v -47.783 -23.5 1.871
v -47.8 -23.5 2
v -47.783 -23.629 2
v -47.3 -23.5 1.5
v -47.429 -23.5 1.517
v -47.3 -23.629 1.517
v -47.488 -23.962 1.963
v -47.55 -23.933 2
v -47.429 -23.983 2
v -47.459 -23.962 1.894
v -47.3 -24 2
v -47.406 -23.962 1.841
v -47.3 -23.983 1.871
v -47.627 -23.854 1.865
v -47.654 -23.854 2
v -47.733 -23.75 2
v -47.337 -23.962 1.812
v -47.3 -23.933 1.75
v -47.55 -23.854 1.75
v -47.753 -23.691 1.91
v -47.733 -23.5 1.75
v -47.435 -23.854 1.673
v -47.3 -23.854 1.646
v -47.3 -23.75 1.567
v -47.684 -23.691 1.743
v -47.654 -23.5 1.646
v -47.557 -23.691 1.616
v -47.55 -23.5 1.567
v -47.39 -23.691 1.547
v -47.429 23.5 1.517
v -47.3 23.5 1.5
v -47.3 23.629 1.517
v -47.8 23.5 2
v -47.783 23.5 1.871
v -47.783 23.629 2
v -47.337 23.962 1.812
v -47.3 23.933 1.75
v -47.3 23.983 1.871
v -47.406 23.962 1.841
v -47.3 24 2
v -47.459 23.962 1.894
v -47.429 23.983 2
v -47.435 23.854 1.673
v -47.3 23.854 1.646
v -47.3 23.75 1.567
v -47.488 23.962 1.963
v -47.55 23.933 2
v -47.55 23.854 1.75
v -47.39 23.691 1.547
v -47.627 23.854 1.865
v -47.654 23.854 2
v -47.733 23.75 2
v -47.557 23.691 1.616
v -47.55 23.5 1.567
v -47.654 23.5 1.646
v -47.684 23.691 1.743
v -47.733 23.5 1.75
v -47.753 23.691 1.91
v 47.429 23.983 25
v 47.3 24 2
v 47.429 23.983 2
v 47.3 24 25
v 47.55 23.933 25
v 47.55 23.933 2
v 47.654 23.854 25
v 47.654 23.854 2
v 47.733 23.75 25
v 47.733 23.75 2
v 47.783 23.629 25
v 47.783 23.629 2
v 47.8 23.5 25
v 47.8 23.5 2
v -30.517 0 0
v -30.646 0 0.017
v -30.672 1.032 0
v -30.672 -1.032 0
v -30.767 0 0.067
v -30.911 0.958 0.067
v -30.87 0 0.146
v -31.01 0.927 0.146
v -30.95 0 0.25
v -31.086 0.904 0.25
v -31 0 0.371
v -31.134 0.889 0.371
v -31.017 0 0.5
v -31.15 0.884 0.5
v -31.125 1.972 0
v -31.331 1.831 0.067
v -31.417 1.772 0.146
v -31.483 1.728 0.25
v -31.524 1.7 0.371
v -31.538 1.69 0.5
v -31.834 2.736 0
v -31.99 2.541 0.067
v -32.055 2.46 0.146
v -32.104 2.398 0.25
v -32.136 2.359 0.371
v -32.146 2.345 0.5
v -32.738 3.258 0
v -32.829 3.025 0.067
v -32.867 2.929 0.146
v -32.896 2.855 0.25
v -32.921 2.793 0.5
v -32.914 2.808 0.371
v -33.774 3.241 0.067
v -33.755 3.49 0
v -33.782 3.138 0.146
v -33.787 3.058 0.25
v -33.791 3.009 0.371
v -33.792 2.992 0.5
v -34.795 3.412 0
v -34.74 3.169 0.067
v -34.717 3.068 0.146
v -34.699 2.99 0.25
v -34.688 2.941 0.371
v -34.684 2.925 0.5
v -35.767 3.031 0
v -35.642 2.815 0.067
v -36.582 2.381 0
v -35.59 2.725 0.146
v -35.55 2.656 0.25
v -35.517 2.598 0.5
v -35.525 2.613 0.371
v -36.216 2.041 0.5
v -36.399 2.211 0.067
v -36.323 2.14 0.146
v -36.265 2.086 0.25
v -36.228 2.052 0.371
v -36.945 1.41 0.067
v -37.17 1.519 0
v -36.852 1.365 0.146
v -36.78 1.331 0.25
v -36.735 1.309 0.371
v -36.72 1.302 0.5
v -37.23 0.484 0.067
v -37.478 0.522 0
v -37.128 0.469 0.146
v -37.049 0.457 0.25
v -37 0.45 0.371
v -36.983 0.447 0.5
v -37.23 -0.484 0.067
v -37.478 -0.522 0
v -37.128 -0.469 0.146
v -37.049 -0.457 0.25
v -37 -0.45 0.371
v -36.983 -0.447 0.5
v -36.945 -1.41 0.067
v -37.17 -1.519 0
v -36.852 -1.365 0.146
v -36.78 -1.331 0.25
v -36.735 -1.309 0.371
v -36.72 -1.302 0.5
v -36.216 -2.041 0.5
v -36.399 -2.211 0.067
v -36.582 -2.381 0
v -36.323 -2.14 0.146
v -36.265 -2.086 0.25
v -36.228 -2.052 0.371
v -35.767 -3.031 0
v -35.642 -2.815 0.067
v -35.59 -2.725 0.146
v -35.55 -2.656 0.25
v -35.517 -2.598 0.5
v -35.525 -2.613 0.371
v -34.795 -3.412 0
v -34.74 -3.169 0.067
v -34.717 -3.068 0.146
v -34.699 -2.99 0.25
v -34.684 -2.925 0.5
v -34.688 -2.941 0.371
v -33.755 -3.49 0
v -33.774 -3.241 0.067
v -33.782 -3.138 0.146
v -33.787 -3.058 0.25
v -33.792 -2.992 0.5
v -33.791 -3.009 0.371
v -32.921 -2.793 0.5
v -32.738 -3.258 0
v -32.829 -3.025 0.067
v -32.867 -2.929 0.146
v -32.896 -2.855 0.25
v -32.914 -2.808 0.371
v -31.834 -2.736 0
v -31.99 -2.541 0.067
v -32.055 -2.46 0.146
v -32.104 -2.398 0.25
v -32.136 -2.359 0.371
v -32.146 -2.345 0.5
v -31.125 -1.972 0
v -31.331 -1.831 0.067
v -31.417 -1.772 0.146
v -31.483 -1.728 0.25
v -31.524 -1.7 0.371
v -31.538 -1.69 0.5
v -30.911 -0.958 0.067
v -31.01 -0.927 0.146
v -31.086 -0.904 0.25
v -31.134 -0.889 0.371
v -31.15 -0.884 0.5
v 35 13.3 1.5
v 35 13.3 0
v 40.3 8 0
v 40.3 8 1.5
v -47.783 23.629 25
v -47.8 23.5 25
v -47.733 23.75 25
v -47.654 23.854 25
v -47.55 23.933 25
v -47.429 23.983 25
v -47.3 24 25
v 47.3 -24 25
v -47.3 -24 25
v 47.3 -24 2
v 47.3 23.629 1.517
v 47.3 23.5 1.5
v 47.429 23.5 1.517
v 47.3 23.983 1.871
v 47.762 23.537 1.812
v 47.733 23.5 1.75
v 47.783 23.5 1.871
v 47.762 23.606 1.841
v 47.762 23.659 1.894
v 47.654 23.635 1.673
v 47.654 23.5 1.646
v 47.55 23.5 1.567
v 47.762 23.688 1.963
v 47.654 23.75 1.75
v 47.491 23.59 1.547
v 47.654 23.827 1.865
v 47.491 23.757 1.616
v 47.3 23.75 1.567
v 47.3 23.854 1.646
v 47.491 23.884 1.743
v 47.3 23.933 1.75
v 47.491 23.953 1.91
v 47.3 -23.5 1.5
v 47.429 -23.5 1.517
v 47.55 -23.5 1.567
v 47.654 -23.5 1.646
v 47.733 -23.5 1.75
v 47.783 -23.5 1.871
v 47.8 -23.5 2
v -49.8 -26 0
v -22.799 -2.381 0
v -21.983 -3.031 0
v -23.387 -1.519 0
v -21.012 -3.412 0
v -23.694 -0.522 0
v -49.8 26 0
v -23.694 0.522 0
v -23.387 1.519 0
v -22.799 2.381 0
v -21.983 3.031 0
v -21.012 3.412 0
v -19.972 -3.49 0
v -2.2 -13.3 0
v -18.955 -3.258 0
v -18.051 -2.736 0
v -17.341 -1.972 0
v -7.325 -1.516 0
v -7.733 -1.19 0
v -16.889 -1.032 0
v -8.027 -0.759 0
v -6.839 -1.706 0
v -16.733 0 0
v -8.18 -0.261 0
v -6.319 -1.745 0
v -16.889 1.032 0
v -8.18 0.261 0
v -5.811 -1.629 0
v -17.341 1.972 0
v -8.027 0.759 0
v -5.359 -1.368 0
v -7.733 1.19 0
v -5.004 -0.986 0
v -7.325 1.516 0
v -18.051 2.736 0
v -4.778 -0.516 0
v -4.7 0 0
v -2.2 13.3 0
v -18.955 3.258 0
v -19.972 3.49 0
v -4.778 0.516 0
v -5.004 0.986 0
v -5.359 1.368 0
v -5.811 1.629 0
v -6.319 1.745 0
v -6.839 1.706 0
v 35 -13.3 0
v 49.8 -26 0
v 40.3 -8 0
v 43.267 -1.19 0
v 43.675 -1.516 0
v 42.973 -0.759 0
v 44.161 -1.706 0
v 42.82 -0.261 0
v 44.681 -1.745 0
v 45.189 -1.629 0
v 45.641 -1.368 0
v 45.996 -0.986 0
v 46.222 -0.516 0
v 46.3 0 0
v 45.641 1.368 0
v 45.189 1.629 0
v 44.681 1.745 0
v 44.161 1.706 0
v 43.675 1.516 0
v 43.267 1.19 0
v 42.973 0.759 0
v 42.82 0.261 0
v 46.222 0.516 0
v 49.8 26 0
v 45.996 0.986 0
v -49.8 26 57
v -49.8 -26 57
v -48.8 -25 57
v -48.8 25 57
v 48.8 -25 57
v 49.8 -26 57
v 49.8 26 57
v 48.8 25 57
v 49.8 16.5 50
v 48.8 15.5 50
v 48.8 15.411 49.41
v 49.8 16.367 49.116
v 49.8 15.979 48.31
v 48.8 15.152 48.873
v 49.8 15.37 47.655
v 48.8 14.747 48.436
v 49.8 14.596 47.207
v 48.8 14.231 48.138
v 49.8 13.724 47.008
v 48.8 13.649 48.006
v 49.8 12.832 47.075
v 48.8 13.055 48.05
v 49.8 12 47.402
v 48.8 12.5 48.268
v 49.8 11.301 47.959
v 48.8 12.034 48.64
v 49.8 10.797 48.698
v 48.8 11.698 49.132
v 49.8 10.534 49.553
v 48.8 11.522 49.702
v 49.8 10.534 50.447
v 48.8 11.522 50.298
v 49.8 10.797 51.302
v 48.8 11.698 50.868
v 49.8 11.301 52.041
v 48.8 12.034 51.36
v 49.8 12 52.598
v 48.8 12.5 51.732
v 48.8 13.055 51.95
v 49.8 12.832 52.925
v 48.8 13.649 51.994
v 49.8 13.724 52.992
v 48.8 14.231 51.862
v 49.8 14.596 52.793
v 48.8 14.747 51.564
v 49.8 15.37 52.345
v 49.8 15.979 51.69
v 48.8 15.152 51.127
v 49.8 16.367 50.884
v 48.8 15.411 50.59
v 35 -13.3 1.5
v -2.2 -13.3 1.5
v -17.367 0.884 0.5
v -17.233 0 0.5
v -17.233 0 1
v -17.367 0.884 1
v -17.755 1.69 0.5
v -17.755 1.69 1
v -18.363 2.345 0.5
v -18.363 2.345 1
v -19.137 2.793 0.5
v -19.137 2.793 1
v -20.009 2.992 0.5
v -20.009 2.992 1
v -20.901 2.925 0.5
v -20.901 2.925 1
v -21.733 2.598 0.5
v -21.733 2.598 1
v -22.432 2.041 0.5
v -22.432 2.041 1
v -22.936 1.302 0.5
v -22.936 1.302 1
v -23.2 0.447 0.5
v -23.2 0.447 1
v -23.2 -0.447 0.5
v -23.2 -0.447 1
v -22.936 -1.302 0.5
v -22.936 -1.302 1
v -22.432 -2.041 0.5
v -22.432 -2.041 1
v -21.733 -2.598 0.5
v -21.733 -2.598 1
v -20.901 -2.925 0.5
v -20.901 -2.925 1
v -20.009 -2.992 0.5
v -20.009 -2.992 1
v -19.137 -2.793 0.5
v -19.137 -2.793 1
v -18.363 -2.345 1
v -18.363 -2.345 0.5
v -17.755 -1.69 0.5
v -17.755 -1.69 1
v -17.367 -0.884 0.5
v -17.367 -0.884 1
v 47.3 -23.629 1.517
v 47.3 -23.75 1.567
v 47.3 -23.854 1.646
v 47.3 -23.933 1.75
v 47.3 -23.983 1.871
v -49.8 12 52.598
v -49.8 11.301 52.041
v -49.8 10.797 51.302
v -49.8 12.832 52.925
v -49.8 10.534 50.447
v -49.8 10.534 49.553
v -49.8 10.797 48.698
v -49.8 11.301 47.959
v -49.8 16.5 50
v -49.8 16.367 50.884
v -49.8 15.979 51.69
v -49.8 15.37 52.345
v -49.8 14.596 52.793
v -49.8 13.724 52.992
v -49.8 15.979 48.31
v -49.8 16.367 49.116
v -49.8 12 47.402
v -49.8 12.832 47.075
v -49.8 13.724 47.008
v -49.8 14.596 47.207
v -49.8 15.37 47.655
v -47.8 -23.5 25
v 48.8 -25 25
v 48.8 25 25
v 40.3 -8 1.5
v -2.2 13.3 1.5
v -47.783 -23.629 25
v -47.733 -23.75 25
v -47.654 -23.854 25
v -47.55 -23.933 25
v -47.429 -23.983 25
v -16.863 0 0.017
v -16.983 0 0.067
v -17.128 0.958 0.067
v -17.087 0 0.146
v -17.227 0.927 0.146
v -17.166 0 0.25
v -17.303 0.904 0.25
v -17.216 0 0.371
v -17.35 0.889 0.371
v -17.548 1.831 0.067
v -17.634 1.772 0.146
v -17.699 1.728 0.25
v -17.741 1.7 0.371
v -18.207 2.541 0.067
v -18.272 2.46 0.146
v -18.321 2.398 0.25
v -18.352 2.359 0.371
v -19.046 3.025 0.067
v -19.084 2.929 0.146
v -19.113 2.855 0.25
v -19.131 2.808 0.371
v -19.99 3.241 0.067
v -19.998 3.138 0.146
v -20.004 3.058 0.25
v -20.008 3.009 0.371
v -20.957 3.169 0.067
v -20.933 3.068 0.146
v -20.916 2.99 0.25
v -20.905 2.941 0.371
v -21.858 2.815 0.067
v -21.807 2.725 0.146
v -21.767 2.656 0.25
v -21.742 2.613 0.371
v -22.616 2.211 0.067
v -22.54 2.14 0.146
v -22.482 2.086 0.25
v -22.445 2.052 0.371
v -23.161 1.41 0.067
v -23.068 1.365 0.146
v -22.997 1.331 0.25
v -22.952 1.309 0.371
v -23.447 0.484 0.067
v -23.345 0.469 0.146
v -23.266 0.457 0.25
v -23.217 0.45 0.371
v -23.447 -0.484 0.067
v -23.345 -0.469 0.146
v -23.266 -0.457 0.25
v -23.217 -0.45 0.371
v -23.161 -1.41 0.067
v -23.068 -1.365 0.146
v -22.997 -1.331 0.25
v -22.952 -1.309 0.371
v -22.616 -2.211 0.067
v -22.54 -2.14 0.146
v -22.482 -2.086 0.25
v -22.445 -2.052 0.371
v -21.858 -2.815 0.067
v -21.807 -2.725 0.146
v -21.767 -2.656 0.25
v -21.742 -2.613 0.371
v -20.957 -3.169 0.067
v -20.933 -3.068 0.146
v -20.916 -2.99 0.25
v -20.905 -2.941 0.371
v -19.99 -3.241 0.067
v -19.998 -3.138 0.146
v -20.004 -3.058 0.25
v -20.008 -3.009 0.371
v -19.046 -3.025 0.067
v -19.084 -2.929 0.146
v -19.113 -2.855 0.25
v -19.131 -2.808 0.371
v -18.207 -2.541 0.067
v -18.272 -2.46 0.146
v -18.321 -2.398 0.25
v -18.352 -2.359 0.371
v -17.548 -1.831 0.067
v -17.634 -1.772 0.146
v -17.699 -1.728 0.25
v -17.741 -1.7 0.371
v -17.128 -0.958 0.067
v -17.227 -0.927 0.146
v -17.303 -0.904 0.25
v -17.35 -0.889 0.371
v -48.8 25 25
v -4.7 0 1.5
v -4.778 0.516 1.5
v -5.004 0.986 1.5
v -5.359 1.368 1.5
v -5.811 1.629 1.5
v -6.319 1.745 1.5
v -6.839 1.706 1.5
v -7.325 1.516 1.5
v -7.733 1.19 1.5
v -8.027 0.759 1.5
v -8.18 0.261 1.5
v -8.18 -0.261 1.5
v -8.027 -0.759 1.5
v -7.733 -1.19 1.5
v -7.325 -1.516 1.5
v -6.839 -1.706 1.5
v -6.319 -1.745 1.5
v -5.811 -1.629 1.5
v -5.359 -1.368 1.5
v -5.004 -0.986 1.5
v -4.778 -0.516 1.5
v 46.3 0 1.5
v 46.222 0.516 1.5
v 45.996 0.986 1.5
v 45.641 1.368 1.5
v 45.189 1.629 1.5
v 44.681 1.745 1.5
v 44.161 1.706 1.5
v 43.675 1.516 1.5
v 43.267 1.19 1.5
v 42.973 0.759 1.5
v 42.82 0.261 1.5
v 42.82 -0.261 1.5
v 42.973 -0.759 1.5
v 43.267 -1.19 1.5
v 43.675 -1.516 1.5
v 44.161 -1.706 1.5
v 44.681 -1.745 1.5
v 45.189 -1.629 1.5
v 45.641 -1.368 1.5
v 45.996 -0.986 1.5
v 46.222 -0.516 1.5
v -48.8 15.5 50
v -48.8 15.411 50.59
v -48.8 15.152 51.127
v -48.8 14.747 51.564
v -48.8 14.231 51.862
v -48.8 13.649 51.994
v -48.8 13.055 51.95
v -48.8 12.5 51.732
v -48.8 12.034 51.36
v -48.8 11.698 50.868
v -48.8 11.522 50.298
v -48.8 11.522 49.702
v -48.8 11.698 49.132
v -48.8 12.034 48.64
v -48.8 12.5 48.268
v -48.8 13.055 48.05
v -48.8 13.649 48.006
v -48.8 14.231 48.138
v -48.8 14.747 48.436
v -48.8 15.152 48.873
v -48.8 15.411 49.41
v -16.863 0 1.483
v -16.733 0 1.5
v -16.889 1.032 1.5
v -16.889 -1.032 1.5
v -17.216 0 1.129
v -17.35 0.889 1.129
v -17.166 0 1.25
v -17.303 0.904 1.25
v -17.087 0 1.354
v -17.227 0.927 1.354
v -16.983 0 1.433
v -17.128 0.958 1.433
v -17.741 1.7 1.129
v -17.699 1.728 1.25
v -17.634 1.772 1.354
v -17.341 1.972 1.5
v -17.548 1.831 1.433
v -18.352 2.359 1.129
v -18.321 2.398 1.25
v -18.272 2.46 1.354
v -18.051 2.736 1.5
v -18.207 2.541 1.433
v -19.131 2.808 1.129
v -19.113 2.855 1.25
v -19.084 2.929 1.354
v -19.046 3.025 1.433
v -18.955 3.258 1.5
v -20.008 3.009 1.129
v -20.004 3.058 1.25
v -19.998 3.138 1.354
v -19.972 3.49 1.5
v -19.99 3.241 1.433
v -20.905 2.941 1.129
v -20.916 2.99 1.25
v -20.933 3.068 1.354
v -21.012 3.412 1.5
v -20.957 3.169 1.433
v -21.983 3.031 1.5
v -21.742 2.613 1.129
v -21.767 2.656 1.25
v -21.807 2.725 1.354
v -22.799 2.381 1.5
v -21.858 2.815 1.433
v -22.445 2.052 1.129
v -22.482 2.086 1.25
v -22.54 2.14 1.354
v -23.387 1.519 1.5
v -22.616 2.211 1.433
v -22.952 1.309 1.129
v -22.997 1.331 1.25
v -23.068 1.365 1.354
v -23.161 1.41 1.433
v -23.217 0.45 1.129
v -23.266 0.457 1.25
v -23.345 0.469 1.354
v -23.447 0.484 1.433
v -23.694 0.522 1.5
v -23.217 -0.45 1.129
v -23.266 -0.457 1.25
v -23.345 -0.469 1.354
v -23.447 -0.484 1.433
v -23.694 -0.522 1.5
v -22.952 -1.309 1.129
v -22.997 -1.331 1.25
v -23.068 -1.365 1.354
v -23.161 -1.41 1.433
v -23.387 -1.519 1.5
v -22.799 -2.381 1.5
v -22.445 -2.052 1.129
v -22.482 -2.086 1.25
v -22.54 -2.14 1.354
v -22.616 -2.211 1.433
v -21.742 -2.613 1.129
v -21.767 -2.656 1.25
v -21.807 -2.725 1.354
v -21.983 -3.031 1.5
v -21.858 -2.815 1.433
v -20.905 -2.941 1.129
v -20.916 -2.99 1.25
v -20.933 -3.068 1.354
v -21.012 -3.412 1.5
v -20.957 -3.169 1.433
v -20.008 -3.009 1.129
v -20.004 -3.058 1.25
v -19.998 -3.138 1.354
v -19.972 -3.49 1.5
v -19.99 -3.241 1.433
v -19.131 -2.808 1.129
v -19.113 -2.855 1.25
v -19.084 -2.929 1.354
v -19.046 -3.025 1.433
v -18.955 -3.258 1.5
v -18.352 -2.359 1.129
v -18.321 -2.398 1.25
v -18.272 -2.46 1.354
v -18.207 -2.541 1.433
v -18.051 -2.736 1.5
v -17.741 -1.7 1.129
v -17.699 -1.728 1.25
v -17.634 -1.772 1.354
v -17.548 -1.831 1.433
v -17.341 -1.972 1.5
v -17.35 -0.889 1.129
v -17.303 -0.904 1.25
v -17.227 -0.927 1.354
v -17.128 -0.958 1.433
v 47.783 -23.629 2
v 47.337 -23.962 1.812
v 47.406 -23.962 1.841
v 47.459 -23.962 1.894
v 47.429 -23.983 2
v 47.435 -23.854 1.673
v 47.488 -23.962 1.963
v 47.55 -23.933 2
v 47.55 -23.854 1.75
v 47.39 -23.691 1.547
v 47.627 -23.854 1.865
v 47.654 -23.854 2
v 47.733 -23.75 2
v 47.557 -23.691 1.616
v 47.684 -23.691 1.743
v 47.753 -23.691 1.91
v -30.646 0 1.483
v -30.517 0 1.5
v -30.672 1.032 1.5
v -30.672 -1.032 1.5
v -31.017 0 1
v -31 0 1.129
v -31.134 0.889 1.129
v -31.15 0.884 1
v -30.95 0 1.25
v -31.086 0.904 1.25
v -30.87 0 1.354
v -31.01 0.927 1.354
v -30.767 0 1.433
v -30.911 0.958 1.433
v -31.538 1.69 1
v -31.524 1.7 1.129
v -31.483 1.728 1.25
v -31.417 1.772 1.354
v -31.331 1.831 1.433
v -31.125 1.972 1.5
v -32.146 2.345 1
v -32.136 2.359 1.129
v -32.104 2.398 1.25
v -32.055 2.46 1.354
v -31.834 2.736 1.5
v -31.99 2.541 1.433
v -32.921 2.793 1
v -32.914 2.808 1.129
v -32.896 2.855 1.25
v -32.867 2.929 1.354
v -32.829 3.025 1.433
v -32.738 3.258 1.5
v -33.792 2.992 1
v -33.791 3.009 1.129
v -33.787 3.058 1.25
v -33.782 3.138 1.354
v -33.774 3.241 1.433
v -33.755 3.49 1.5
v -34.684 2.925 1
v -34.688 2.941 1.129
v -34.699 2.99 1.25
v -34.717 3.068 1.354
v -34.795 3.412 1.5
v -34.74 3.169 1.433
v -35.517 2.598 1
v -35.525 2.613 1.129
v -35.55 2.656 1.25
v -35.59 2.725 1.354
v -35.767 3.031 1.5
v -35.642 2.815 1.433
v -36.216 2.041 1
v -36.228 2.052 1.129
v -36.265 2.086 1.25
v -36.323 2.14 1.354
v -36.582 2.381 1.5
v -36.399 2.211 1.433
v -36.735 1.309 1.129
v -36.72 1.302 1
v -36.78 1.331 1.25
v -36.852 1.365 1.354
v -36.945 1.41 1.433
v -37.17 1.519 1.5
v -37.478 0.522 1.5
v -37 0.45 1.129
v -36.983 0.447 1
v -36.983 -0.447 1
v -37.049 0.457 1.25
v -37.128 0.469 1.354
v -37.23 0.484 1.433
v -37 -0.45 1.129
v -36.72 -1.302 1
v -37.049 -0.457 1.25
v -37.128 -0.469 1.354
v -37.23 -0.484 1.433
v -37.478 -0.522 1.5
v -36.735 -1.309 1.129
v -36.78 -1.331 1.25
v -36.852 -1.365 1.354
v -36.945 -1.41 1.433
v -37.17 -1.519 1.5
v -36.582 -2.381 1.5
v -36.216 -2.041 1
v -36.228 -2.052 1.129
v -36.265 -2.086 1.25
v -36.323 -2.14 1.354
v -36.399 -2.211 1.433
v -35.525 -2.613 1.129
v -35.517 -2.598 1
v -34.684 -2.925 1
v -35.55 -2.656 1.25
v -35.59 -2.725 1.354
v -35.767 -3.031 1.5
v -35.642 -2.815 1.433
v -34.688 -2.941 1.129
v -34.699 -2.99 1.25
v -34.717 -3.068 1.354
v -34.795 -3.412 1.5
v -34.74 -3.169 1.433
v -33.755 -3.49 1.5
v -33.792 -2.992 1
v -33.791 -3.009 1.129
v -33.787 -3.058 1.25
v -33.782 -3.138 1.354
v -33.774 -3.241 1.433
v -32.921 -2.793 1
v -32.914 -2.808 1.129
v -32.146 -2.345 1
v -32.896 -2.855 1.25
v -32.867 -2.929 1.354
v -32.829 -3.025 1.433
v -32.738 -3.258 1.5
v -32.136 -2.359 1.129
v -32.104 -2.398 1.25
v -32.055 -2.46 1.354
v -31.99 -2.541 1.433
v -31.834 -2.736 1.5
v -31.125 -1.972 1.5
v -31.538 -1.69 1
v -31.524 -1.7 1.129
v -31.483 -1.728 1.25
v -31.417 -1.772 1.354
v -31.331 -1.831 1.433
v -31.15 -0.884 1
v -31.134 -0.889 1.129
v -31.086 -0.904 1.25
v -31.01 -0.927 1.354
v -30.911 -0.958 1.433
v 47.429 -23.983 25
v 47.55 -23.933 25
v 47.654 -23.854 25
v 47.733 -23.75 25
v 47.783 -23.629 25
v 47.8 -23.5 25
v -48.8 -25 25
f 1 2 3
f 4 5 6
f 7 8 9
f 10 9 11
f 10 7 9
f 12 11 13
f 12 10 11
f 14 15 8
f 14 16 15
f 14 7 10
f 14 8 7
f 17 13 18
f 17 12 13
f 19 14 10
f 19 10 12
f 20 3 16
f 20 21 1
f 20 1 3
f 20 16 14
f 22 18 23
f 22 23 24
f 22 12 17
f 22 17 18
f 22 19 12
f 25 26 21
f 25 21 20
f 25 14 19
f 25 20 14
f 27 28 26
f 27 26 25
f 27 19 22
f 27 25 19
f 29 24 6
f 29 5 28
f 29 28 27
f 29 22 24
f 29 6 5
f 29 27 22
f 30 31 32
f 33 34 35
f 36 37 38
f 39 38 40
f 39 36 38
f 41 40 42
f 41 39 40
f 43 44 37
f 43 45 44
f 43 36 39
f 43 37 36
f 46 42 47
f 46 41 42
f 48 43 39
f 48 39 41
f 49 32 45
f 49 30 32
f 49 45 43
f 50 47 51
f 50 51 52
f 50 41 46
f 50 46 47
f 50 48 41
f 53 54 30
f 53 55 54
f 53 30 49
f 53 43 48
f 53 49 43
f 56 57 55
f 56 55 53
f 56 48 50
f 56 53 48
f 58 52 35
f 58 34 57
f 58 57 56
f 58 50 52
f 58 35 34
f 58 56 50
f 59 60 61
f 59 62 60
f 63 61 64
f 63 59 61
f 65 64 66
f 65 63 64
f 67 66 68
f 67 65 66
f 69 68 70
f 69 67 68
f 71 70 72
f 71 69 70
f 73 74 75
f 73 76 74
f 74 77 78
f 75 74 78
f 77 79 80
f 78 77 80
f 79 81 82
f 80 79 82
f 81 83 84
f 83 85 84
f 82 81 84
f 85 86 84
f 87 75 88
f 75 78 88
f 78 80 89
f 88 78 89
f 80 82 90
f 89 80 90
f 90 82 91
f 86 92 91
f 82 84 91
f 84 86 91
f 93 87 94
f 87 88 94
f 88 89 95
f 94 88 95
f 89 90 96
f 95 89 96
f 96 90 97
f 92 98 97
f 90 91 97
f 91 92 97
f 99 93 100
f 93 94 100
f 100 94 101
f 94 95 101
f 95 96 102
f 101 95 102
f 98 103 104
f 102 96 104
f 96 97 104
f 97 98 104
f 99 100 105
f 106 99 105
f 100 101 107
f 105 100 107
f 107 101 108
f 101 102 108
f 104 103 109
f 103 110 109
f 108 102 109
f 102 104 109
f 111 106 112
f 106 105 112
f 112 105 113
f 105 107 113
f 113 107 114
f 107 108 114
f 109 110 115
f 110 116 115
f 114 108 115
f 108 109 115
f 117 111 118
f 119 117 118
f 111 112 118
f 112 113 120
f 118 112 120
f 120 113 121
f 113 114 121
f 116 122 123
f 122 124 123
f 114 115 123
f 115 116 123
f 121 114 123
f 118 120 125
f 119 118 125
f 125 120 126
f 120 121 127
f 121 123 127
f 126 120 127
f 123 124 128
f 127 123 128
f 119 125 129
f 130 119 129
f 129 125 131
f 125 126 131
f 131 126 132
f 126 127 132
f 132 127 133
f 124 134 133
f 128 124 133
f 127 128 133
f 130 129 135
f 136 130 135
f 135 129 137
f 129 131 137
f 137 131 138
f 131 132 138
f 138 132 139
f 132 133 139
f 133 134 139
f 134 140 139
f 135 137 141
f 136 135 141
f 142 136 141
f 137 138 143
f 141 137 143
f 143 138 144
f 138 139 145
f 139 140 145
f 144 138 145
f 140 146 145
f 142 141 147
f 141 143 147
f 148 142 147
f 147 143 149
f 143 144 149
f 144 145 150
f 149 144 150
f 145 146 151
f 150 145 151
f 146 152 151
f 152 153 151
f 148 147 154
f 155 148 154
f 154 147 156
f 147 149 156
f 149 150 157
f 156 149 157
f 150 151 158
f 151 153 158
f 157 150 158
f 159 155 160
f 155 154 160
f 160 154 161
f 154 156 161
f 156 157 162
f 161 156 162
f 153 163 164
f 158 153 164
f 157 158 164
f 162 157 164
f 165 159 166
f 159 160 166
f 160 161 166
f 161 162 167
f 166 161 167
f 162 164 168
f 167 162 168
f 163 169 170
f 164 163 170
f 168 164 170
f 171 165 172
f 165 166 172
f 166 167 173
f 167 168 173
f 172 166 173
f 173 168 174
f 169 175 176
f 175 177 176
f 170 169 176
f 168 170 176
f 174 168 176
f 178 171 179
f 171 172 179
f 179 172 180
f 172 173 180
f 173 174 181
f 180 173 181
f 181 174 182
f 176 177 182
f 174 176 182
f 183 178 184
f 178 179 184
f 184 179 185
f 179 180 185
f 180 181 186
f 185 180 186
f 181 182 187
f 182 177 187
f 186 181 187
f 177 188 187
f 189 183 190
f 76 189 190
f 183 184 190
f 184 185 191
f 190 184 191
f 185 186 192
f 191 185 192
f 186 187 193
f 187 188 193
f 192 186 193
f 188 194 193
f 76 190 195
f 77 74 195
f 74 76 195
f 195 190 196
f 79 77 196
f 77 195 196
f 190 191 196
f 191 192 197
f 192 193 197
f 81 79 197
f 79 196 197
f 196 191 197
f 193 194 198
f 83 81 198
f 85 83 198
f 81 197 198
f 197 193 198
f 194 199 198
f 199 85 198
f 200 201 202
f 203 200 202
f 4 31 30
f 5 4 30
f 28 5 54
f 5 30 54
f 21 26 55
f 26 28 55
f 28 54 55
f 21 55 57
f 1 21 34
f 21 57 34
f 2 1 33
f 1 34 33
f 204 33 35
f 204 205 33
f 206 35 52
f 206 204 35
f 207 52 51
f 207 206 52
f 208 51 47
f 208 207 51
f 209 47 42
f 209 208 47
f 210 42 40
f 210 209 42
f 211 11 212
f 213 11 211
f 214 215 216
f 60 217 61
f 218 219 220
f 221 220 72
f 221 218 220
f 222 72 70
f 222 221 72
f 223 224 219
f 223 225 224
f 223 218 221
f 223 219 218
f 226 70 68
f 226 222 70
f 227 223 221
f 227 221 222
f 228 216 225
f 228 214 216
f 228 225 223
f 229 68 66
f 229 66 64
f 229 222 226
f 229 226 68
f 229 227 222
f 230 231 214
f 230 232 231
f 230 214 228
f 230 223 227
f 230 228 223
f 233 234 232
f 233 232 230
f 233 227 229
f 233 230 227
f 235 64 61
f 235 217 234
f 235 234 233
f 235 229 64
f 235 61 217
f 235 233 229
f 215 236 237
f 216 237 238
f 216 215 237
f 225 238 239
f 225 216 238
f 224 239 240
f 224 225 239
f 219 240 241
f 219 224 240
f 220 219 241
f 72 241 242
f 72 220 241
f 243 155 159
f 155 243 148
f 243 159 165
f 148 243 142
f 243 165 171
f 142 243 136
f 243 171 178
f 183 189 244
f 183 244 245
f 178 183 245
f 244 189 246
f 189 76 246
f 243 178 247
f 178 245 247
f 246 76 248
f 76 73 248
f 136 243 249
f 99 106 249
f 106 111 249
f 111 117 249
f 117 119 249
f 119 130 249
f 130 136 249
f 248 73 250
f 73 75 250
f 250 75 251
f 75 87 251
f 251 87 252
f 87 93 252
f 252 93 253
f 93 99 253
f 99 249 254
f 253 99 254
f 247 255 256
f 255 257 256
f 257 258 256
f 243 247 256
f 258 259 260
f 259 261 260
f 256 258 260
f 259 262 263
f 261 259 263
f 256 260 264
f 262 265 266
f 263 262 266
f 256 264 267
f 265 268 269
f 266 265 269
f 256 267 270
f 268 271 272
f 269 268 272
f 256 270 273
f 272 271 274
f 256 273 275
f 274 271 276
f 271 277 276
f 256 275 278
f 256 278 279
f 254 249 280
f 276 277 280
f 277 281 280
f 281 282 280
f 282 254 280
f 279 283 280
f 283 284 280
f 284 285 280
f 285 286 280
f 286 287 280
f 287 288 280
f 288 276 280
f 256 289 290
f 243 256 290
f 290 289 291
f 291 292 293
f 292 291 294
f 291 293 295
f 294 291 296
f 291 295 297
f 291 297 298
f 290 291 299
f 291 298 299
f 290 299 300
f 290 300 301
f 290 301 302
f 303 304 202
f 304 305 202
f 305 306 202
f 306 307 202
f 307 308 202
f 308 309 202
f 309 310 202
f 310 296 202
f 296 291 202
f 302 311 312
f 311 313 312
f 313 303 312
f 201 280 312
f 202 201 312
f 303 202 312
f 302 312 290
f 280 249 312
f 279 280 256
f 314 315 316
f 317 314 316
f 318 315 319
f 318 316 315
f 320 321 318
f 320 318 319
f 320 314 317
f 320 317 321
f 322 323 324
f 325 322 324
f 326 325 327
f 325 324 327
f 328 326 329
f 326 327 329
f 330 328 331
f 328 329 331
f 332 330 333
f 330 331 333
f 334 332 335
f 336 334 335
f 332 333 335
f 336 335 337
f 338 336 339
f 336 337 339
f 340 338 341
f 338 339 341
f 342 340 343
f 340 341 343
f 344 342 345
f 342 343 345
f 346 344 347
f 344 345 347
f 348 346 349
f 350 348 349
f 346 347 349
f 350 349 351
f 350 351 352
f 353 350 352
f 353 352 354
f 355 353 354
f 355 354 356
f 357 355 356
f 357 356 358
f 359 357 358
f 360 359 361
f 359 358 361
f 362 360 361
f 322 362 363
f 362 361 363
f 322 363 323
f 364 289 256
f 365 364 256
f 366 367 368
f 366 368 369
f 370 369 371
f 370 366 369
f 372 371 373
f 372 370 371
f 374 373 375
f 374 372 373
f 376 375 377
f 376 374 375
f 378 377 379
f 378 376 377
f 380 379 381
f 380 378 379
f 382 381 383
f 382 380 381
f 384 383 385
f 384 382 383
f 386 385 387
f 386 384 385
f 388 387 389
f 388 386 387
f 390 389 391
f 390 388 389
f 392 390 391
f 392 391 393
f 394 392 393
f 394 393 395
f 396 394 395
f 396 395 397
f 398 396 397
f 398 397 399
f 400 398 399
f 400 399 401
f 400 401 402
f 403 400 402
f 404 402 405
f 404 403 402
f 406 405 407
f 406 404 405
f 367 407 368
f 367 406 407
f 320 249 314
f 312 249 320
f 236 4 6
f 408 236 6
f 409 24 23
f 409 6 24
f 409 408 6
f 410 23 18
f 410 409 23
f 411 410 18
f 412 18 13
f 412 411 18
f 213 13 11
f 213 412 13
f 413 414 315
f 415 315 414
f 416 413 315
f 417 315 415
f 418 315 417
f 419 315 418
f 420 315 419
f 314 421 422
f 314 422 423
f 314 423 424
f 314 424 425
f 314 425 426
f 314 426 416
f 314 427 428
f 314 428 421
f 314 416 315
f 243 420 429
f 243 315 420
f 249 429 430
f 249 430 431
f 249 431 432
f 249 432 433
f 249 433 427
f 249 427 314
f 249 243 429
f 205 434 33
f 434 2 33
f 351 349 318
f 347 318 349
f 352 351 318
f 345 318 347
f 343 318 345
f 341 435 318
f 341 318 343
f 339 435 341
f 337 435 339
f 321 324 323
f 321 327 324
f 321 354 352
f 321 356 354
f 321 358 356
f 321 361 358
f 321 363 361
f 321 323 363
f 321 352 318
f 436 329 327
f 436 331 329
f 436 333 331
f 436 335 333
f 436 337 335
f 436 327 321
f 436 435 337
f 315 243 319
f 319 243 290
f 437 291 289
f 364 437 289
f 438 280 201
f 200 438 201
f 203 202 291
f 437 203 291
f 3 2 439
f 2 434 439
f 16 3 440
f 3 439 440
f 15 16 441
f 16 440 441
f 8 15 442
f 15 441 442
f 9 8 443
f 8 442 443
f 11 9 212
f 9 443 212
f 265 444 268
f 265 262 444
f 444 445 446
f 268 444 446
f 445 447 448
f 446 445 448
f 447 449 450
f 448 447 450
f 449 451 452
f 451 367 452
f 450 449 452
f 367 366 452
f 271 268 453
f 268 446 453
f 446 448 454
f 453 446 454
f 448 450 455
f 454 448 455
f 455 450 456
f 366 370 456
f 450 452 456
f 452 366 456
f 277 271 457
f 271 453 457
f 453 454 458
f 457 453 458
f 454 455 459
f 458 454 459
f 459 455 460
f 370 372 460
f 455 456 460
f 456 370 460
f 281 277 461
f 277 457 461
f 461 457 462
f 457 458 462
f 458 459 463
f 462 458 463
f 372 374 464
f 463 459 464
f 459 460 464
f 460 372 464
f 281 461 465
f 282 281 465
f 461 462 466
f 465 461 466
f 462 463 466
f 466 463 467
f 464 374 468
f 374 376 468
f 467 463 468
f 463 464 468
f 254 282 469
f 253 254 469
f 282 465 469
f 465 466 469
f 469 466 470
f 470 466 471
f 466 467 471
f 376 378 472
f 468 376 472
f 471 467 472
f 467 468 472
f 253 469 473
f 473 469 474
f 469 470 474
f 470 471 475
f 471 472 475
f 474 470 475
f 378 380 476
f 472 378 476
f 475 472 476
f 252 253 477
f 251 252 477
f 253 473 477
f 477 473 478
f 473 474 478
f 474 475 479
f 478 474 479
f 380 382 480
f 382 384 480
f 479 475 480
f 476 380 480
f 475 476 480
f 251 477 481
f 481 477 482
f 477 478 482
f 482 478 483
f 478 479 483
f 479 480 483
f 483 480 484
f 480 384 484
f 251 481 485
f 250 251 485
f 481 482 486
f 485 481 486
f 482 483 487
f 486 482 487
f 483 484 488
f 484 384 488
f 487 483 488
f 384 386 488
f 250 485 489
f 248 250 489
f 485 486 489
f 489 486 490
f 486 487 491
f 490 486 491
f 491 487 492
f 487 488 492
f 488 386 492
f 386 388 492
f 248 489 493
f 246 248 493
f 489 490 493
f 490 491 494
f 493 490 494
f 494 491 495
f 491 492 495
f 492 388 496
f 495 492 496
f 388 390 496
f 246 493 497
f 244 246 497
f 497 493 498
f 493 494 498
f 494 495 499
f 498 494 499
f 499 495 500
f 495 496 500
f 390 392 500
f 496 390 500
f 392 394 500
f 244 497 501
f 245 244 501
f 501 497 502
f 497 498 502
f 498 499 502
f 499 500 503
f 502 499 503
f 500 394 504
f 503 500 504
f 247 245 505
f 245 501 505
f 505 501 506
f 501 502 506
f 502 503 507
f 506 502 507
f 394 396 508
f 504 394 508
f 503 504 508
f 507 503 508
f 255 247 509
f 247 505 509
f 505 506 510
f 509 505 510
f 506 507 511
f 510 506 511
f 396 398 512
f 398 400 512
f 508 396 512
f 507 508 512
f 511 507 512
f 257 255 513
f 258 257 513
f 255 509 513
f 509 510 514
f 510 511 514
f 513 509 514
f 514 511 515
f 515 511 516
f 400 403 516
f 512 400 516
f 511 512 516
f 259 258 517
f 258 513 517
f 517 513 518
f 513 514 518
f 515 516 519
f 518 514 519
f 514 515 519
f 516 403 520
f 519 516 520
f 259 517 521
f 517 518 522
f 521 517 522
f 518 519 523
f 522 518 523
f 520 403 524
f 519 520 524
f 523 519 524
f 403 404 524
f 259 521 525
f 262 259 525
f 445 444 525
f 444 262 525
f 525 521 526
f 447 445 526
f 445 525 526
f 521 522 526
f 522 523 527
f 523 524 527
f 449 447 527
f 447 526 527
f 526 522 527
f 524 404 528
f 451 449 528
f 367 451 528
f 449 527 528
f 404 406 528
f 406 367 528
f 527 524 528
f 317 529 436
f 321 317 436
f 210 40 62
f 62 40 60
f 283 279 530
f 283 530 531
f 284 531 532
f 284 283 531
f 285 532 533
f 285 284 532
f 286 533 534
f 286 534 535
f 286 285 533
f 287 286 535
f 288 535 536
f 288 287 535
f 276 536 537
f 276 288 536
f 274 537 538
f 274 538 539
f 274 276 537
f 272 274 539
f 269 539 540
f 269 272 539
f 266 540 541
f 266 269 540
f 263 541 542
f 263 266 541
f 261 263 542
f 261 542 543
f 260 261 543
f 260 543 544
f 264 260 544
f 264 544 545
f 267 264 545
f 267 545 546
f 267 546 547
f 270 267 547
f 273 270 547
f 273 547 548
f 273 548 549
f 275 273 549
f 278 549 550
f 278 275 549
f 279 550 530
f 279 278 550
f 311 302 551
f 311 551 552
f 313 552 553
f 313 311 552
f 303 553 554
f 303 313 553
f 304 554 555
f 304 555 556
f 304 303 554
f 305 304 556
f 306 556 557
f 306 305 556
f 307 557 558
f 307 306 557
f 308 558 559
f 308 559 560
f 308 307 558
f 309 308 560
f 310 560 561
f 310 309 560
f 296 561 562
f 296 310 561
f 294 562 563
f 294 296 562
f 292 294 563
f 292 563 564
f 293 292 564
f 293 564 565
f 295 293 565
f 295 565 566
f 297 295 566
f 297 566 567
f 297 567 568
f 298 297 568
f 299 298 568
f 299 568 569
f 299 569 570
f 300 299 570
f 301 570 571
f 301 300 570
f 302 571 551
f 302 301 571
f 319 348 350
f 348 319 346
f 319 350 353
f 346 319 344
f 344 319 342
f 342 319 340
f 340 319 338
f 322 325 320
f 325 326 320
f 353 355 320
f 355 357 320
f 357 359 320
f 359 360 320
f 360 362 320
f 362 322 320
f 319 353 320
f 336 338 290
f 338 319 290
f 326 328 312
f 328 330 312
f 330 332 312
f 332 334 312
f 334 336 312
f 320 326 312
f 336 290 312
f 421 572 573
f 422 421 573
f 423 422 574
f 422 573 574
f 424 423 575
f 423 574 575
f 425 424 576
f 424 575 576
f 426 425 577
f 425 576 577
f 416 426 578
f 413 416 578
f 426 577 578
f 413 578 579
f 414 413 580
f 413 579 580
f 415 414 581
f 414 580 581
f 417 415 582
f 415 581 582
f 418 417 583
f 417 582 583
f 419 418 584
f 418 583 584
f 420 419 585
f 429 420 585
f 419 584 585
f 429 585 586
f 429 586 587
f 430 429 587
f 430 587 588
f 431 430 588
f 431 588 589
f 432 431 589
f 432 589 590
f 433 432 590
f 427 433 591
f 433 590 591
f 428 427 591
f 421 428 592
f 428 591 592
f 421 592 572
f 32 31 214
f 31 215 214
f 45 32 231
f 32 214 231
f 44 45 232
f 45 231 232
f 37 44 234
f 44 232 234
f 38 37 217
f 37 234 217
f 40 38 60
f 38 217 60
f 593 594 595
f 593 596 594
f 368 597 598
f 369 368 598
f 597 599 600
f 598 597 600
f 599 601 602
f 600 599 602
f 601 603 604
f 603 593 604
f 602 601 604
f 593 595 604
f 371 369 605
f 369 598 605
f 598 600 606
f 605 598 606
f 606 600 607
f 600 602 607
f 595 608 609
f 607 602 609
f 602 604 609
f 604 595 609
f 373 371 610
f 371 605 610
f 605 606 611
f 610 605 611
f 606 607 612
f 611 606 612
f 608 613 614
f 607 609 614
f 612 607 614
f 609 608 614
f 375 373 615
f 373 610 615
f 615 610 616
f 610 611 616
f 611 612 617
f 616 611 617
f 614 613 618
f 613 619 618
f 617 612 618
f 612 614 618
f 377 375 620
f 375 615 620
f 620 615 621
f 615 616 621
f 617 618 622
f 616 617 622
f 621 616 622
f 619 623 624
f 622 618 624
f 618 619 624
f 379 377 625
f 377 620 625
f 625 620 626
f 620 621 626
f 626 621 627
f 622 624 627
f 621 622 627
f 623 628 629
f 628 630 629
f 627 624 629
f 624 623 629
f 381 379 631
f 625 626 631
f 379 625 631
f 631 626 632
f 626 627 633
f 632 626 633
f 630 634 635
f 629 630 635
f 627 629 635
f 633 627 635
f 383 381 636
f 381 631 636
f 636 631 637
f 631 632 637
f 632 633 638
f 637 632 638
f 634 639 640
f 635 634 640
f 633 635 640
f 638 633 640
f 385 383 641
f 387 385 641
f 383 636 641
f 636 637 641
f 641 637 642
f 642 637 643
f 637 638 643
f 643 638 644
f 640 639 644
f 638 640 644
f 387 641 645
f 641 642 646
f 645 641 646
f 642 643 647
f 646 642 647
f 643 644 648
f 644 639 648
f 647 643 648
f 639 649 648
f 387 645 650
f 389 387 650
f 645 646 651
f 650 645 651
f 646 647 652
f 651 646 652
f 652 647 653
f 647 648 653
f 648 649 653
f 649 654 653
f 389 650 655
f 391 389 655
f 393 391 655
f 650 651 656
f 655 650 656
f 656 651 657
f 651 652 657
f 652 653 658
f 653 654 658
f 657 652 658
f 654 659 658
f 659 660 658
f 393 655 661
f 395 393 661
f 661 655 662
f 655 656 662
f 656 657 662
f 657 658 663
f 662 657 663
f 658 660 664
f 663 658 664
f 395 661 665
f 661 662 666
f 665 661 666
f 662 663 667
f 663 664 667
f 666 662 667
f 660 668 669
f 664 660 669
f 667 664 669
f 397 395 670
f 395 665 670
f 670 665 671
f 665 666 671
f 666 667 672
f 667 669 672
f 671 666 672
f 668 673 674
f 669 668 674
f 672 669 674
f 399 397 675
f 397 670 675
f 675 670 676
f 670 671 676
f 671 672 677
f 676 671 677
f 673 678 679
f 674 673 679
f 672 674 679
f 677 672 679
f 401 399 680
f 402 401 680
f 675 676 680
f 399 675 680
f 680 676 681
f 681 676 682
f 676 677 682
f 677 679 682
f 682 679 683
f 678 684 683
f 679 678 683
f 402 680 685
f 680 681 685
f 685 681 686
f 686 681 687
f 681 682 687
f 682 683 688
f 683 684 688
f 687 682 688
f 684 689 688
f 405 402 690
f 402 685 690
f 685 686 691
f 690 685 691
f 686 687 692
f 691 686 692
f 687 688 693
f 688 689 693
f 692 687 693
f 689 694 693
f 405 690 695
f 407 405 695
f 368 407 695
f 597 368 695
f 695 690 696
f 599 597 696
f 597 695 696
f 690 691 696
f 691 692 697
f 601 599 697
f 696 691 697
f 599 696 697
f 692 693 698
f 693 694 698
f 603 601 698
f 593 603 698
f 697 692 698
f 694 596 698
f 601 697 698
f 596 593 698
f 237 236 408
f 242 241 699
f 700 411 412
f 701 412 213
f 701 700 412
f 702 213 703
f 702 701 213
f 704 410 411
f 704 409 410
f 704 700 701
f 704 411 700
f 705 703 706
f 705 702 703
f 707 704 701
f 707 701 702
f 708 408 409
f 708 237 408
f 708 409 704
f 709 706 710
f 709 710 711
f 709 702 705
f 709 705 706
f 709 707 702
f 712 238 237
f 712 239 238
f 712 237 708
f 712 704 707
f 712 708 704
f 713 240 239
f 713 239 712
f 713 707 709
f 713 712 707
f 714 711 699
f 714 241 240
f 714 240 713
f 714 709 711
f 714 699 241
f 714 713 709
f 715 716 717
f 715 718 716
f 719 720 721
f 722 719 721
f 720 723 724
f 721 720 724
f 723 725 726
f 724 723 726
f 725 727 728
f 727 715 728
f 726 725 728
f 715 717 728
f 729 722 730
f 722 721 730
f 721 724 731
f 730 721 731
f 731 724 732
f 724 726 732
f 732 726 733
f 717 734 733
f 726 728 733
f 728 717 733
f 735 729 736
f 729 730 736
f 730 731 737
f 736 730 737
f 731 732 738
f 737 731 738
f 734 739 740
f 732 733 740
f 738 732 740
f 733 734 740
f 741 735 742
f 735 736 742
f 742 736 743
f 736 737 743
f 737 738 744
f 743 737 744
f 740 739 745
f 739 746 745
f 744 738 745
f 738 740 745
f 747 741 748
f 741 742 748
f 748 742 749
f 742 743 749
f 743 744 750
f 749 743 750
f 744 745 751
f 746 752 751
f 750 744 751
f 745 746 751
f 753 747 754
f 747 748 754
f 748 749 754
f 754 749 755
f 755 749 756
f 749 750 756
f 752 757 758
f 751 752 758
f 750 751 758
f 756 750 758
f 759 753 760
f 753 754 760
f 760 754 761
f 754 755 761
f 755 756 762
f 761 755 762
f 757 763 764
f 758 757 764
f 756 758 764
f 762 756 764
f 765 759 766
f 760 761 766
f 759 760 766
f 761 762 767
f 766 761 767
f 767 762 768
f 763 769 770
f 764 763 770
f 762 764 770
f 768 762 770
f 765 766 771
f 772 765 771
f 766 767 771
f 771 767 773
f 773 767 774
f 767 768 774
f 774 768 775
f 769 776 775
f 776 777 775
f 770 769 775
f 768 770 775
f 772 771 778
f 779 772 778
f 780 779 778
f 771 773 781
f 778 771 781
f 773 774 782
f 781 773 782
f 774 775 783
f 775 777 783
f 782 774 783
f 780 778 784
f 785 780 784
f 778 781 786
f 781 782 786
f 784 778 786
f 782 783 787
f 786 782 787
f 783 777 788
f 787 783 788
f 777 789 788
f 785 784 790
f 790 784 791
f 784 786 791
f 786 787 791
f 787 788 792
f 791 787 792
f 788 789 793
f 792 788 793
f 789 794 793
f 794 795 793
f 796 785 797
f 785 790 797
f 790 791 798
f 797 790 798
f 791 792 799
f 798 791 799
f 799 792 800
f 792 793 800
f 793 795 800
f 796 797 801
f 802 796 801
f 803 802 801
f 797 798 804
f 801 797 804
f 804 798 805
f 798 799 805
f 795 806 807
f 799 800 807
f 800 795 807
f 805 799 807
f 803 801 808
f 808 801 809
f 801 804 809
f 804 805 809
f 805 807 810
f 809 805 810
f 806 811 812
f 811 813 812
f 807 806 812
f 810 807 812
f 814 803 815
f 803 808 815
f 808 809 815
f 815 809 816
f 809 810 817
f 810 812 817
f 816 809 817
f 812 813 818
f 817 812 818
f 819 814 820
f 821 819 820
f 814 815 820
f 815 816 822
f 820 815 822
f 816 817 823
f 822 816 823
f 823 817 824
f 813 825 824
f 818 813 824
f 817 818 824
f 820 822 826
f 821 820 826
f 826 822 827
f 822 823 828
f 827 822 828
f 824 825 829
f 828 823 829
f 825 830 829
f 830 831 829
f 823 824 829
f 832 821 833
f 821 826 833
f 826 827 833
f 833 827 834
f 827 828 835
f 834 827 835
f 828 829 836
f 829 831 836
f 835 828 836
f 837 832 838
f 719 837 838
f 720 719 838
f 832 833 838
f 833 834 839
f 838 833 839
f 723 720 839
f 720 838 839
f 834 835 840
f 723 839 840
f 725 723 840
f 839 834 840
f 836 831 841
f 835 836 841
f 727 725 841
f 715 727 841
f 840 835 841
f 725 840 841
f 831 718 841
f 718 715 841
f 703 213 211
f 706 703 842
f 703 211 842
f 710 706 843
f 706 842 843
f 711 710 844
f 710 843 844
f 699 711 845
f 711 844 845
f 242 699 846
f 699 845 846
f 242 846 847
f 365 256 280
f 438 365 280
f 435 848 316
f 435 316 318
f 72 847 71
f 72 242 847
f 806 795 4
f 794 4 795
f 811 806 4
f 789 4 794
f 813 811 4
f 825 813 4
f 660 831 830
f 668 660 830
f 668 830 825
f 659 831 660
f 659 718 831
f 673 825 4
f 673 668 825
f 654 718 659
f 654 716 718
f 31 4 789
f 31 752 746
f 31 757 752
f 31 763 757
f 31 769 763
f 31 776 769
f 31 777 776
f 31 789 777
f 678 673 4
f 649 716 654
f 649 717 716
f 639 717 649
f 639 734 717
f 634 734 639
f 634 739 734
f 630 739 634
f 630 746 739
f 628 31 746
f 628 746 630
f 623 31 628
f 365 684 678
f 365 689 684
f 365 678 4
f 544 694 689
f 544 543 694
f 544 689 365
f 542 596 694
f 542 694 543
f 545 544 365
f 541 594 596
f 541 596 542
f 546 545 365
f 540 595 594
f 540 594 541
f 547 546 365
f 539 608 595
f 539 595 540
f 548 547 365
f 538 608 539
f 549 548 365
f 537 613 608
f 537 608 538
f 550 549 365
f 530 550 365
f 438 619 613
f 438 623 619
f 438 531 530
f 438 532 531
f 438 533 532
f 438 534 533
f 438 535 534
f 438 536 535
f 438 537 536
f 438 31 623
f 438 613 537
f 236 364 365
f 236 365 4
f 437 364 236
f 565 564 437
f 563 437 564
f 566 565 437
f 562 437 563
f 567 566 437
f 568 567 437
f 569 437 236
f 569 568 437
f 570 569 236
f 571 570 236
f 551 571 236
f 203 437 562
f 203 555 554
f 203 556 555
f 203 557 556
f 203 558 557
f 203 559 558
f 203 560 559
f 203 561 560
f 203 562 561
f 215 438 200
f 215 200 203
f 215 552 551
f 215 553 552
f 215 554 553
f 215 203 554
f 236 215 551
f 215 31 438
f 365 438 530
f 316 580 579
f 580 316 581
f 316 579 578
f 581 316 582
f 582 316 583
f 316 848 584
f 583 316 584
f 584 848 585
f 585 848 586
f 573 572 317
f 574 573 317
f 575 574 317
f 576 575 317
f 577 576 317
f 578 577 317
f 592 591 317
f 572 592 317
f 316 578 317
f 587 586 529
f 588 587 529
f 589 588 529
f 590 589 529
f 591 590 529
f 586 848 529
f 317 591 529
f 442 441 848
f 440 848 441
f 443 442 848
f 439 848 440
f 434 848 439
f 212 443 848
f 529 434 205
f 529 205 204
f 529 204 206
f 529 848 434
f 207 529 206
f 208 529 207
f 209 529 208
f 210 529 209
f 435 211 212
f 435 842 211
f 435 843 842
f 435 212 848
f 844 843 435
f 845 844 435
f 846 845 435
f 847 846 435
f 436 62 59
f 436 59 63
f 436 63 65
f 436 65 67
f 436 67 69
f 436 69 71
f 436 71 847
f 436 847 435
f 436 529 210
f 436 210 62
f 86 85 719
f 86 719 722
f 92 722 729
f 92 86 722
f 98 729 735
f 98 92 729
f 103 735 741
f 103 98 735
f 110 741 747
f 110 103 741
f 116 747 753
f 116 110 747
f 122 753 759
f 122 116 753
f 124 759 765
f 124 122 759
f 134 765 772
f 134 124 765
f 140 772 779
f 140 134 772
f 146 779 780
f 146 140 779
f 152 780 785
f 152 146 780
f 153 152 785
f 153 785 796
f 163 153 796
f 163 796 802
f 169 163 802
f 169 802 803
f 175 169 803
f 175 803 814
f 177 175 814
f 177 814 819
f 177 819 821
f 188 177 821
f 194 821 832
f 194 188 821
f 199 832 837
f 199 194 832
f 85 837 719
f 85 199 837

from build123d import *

# Parameters (mm, degrees)
F1_W          = 95.6
F1_H          = 48
F1_R          = 3
F1_R_2        = 1.75
F2_DEPTH      = 1.5
F1_W_2        = 97.6
F1_H_2        = 50
F3_DEPTH      = 25
F1_W_3        = 99.6
F1_H_3        = 52
F4_DEPTH      = 57
F5_R          = 2
F6_DEPTH      = 49.801
F6_DEPTH_BACK = 49.801
F7_SIZE       = 0.99999
F8_R          = 0.5


# Not quite as in the source:
# - a fillet or chamfer is up to 0.001 mm smaller than in the source, because OpenCascade refuses the exact size


with BuildPart() as f2:
    # F1 (on Top) → F2 (new body)
    with BuildSketch(Plane.XY):
        Rectangle(F1_W, F1_H)
        with Locations((-34.0166666667, 0)):
            Circle(F1_R, mode=Mode.SUBTRACT)
        with Locations((-20.2333333333, 0)):
            Circle(F1_R, mode=Mode.SUBTRACT)
        with Locations((-6.45, 0)):
            Circle(F1_R_2, mode=Mode.SUBTRACT)
        Polygon((-2.2, -13.3), (-2.2, 13.3), (35, 13.3), (40.3, 8), (40.3, -8), (35, -13.3), align=None, mode=Mode.SUBTRACT)
        with Locations((44.55, 0)):
            Circle(F1_R_2, mode=Mode.SUBTRACT)
    extrude(amount=F2_DEPTH)

    # F1 (on Top) → F3 (join)
    with BuildSketch(Plane.XY):
        Rectangle(F1_W_2, F1_H_2)
        Rectangle(F1_W, F1_H, mode=Mode.SUBTRACT)
    extrude(amount=F3_DEPTH)

    # F1 (on Top) → F4 (join)
    with BuildSketch(Plane.XY):
        Rectangle(F1_W_3, F1_H_3)
        Rectangle(F1_W_2, F1_H_2, mode=Mode.SUBTRACT)
    extrude(amount=F4_DEPTH)

    # F5 (on Right) → F6 (cut, two sides)
    with BuildSketch(Plane.YZ) as f6_sk:
        with Locations((13.5, 50)):
            Circle(F5_R)
    extrude(amount=-F6_DEPTH, mode=Mode.SUBTRACT)
    extrude(f6_sk.sketch, amount=F6_DEPTH_BACK, mode=Mode.SUBTRACT)

    # F7 (size 1 in the source; OpenCascade refuses exactly that, so slightly less here)
    f7_edges = [f2.edges().sort_by_distance(p)[0] for p in [
        (49.8, 11.5, 50),
        (-49.8, 11.5, 50),
    ]]
    chamfer(f7_edges, length=F7_SIZE)

    # F8
    f8_edges = [f2.edges().sort_by_distance(p)[0] for p in [
        (-17.233333, 0, 0.75),
        (-23.233333, 0, 0),
        (-23.233333, 0, 1.5),
        (-31.016667, 0, 0.75),
        (-37.016667, 0, 0),
        (-37.016667, 0, 1.5),
        (-47.8, 0, 1.5),
        (0, 24, 1.5),
        (47.8, 0, 1.5),
        (47.8, 24, 13.25),
        (-47.8, 24, 13.25),
        (-47.8, -24, 13.25),
        (0, -24, 1.5),
        (47.8, -24, 13.25),
    ]]
    fillet(f8_edges, radius=F8_R)


solid = f2.part
